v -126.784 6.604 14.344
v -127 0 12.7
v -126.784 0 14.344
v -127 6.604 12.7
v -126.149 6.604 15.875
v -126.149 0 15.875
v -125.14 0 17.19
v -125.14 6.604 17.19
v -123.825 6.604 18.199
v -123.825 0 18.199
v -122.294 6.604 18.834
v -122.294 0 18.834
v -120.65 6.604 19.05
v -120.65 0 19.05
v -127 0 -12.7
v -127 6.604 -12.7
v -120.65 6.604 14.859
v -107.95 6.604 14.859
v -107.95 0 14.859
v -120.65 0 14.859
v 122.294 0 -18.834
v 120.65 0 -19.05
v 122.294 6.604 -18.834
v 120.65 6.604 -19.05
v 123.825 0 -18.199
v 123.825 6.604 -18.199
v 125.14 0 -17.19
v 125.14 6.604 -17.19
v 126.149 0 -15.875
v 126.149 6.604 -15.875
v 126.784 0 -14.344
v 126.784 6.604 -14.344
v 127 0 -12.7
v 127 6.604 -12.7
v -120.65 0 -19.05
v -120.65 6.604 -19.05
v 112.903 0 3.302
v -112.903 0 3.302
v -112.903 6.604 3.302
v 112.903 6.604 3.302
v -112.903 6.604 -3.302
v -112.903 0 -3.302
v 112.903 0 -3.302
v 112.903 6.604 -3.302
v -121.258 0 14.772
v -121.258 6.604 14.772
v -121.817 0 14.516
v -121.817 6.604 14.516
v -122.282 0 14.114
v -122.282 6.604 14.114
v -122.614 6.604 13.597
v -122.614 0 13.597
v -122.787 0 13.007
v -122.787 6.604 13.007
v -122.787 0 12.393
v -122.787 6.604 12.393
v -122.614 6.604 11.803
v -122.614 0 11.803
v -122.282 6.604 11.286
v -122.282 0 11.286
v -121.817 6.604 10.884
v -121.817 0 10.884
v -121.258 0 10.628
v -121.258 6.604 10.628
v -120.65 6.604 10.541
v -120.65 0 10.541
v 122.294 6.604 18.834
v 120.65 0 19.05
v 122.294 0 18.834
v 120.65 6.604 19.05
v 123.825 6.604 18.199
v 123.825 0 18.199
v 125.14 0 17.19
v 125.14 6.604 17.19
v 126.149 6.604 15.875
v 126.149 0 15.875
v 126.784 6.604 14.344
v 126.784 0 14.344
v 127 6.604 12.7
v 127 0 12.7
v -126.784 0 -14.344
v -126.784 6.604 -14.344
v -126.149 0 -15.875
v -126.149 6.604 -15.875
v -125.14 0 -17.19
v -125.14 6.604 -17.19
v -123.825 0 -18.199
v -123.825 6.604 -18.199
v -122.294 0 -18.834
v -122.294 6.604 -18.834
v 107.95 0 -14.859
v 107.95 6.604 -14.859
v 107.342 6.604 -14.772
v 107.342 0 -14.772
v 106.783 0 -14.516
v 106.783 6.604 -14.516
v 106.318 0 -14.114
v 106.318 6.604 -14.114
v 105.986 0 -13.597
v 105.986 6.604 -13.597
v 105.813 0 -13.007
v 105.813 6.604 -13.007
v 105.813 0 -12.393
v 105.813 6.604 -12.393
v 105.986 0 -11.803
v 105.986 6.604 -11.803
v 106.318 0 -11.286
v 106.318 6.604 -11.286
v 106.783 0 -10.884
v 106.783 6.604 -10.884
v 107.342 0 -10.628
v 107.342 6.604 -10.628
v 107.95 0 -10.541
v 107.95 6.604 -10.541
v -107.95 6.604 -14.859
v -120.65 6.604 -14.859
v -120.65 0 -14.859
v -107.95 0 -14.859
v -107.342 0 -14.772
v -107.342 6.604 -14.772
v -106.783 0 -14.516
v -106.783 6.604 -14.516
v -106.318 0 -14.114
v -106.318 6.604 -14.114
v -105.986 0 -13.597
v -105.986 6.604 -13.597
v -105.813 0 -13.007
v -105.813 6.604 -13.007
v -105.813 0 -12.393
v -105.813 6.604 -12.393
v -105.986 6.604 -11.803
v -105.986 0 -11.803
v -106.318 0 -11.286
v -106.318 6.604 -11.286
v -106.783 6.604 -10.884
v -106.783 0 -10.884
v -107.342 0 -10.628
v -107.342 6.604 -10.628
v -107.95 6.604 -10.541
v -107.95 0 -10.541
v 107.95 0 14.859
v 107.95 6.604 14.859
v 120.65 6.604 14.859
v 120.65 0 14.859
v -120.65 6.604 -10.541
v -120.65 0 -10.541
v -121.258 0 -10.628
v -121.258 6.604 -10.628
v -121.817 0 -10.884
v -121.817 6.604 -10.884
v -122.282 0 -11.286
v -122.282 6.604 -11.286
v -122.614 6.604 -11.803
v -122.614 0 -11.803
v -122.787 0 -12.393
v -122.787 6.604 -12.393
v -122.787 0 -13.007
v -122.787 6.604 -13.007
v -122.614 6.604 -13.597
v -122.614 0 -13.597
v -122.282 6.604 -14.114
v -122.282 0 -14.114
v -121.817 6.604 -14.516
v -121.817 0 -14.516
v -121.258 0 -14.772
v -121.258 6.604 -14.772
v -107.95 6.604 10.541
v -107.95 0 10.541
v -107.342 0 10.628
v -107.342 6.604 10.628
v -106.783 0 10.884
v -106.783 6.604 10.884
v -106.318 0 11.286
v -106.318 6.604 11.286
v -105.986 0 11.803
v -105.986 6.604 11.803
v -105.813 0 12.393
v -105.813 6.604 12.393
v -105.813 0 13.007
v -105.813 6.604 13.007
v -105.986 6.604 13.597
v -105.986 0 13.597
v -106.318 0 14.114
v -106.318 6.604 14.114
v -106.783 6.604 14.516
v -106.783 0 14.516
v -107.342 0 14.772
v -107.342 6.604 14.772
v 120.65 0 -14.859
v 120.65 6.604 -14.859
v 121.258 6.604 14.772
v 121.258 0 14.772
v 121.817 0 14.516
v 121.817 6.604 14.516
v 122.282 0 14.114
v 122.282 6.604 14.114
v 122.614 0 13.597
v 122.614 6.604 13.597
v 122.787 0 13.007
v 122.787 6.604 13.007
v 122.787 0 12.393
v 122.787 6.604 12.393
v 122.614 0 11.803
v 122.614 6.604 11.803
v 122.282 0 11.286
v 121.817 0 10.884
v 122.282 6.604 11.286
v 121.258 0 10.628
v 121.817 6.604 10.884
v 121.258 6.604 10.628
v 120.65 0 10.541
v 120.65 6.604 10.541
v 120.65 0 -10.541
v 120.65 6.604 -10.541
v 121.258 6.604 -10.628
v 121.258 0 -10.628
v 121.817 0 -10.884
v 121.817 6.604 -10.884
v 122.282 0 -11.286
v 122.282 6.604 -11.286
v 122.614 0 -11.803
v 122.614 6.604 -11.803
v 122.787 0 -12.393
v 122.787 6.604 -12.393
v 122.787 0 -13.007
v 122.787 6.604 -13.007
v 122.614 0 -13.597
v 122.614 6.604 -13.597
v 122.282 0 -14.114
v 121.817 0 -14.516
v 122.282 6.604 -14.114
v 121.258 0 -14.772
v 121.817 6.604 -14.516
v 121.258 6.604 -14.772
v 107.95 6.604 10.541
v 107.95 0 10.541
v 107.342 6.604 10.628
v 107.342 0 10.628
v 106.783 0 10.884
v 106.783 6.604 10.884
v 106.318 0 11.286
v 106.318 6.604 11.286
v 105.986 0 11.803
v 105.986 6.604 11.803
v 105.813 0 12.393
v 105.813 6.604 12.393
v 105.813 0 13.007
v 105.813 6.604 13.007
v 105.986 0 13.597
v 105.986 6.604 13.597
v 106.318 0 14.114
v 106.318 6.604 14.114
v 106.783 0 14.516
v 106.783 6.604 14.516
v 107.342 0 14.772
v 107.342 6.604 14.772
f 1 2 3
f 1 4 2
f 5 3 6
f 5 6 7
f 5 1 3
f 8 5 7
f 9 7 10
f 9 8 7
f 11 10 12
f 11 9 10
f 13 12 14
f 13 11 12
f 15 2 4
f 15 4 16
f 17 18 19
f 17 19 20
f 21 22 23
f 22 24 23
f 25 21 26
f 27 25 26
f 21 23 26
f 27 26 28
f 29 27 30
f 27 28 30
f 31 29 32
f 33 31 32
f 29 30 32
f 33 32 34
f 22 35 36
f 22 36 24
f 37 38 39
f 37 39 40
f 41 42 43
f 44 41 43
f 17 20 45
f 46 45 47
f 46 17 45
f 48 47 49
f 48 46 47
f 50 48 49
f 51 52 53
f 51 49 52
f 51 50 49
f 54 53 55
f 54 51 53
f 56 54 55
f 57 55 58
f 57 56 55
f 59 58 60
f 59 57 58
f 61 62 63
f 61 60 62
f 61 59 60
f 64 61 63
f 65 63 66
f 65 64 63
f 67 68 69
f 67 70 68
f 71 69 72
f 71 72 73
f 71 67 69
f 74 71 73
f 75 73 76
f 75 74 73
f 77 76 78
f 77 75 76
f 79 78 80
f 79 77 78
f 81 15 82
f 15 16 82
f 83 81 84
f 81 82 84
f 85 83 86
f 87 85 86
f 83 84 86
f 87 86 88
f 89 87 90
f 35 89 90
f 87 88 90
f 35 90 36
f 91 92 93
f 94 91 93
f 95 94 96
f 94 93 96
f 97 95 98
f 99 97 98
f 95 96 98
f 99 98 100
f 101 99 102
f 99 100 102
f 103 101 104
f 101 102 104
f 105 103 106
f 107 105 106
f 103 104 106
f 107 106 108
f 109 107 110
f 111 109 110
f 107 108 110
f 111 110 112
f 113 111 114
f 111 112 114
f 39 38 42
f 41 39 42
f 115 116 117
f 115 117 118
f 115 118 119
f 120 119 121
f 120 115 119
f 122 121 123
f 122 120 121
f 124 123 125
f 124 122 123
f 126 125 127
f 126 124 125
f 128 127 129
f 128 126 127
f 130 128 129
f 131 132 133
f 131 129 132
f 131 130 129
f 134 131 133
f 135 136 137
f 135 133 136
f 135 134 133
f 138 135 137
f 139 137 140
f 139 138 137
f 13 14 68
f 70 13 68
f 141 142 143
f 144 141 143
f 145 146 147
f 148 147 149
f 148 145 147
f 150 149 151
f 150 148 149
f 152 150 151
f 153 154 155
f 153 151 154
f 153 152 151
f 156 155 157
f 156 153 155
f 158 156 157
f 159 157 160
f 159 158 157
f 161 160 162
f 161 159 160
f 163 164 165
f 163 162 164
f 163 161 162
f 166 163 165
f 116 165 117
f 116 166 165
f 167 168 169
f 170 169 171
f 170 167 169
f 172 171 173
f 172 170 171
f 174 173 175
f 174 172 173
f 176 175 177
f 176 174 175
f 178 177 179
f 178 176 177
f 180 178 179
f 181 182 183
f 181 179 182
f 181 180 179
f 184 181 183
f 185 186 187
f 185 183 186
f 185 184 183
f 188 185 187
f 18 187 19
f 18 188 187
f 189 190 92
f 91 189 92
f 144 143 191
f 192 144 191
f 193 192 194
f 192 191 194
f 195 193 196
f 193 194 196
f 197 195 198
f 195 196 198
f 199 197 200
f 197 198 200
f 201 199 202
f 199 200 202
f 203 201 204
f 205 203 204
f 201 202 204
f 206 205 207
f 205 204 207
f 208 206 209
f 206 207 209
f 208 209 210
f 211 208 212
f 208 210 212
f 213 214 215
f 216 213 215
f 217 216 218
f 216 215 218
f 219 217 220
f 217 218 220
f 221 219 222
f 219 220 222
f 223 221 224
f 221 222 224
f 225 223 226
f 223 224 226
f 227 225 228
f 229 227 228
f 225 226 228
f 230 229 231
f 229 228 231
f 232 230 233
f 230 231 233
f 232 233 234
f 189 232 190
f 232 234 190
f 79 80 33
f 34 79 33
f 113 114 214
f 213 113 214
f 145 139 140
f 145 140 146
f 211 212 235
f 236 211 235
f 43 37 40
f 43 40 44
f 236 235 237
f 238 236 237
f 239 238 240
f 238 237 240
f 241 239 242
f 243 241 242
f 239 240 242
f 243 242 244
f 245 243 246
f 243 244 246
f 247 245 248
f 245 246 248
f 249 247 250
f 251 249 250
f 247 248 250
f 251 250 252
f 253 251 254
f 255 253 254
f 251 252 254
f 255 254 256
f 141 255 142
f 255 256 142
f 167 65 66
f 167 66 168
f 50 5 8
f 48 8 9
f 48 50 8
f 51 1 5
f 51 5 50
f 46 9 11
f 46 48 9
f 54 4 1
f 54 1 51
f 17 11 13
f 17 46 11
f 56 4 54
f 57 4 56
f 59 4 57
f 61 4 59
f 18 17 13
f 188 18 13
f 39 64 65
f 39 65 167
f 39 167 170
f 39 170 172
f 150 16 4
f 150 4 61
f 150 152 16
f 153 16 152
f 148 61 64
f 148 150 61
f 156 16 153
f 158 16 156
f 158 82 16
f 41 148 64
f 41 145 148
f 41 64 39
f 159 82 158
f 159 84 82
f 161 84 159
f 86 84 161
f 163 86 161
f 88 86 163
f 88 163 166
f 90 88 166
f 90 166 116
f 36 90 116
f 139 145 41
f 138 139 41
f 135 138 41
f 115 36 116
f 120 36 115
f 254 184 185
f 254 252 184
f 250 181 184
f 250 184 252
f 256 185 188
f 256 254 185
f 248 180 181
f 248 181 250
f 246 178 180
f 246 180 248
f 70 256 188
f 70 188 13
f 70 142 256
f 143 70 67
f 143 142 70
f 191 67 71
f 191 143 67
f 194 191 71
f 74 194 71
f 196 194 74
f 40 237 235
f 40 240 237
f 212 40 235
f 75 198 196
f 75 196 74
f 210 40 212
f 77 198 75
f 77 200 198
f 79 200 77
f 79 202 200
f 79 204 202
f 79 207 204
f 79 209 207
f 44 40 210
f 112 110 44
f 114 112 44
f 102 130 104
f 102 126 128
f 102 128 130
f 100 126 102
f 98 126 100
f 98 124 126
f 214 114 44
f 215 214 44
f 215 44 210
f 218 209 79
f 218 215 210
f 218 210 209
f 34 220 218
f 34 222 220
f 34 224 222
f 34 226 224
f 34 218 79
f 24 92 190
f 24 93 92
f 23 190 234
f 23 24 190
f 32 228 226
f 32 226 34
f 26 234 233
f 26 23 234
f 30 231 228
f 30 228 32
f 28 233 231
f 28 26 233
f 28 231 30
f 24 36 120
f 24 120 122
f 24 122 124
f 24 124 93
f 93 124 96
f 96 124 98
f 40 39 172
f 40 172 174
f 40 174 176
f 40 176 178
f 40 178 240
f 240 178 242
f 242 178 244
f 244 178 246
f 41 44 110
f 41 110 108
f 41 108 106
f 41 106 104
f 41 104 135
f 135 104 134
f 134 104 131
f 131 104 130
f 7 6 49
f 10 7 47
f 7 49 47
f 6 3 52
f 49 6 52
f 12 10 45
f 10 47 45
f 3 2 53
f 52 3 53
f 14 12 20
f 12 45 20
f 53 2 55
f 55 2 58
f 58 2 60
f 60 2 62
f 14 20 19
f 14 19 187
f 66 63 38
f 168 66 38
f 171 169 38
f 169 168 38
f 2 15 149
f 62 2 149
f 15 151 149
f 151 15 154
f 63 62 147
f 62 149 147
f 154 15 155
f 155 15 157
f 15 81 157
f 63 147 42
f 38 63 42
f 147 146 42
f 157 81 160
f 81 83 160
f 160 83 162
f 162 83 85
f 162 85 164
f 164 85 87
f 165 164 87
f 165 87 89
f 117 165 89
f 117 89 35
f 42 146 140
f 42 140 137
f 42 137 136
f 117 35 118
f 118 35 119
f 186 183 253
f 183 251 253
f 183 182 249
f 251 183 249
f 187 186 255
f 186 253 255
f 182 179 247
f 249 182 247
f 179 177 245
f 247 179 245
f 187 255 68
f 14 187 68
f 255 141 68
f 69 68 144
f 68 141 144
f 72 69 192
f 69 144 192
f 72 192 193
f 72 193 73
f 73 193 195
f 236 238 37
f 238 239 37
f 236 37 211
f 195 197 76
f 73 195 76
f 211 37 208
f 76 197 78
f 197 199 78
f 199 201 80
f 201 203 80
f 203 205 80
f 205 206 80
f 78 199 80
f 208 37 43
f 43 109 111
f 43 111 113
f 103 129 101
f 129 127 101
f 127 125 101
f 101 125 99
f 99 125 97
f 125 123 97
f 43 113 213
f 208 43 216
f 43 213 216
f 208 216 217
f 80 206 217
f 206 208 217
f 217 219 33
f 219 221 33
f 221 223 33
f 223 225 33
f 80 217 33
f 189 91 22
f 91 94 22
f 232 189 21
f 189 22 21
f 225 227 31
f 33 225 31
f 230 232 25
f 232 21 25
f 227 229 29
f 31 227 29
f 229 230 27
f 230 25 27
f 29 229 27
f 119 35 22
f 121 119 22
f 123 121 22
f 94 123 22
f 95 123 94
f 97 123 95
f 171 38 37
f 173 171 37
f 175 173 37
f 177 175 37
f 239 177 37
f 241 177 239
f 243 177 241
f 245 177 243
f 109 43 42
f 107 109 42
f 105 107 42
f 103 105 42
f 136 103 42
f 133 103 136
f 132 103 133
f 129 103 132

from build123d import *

# Parameters (mm, degrees)
SKETCH1_W           = 254
SKETCH1_H           = 38.1
SKETCH1_W_2         = 225.806
SKETCH1_H_2         = 6.604
BOSS_EXTRUDE1_DEPTH = 6.604
CUT_EXTRUDE1_DEPTH  = 7.604
FILLET1_R           = 6.35


with BuildPart() as part:
    # Sketch1 → Boss-Extrude1 (new body)
    with BuildSketch(Plane(origin=(0, 0, 0), x_dir=(1, 0, 0), z_dir=(0, 1, 0))):
        Rectangle(SKETCH1_W, SKETCH1_H)
        Rectangle(SKETCH1_W_2, SKETCH1_H_2, mode=Mode.SUBTRACT)
    extrude(amount=BOSS_EXTRUDE1_DEPTH)

    # Sketch2 → Cut-Extrude1 (cut, through all)
    with BuildSketch(Plane(origin=(0, 6.604, 0), x_dir=(1, 0, 0), z_dir=(0, 1, 0))):
        with BuildLine():
            Line((-120.65, 14.859), (-107.95, 14.859))
            ThreePointArc((-107.95, 14.859), (-105.791, 12.7), (-107.95, 10.541))
            Line((-107.95, 10.541), (-120.65, 10.541))
            ThreePointArc((-120.65, 10.541), (-122.809, 12.7), (-120.65, 14.859))
        make_face()
        with BuildLine():
            Line((-120.65, -10.541), (-107.95, -10.541))
            ThreePointArc((-107.95, -10.541), (-105.791, -12.7), (-107.95, -14.859))
            Line((-107.95, -14.859), (-120.65, -14.859))
            ThreePointArc((-120.65, -14.859), (-122.809, -12.7), (-120.65, -10.541))
        make_face()
    cut_extrude1 = extrude(amount=-CUT_EXTRUDE1_DEPTH, mode=Mode.SUBTRACT)

    # Mirror1: Cut-Extrude1 across plane
    add(cut_extrude1.mirror(Plane(origin=(0, 0, 0), x_dir=(0, 0, 1), z_dir=(1, 0, 0))), mode=Mode.SUBTRACT)

    # Fillet1
    fillet1_edges = [part.edges().sort_by_distance(p)[0] for p in [
        (-127, 3.302, -19.05),
        (127, 3.302, -19.05),
        (127, 3.302, 19.05),
        (-127, 3.302, 19.05),
    ]]
    fillet(fillet1_edges, radius=FILLET1_R)


solid = part.part
